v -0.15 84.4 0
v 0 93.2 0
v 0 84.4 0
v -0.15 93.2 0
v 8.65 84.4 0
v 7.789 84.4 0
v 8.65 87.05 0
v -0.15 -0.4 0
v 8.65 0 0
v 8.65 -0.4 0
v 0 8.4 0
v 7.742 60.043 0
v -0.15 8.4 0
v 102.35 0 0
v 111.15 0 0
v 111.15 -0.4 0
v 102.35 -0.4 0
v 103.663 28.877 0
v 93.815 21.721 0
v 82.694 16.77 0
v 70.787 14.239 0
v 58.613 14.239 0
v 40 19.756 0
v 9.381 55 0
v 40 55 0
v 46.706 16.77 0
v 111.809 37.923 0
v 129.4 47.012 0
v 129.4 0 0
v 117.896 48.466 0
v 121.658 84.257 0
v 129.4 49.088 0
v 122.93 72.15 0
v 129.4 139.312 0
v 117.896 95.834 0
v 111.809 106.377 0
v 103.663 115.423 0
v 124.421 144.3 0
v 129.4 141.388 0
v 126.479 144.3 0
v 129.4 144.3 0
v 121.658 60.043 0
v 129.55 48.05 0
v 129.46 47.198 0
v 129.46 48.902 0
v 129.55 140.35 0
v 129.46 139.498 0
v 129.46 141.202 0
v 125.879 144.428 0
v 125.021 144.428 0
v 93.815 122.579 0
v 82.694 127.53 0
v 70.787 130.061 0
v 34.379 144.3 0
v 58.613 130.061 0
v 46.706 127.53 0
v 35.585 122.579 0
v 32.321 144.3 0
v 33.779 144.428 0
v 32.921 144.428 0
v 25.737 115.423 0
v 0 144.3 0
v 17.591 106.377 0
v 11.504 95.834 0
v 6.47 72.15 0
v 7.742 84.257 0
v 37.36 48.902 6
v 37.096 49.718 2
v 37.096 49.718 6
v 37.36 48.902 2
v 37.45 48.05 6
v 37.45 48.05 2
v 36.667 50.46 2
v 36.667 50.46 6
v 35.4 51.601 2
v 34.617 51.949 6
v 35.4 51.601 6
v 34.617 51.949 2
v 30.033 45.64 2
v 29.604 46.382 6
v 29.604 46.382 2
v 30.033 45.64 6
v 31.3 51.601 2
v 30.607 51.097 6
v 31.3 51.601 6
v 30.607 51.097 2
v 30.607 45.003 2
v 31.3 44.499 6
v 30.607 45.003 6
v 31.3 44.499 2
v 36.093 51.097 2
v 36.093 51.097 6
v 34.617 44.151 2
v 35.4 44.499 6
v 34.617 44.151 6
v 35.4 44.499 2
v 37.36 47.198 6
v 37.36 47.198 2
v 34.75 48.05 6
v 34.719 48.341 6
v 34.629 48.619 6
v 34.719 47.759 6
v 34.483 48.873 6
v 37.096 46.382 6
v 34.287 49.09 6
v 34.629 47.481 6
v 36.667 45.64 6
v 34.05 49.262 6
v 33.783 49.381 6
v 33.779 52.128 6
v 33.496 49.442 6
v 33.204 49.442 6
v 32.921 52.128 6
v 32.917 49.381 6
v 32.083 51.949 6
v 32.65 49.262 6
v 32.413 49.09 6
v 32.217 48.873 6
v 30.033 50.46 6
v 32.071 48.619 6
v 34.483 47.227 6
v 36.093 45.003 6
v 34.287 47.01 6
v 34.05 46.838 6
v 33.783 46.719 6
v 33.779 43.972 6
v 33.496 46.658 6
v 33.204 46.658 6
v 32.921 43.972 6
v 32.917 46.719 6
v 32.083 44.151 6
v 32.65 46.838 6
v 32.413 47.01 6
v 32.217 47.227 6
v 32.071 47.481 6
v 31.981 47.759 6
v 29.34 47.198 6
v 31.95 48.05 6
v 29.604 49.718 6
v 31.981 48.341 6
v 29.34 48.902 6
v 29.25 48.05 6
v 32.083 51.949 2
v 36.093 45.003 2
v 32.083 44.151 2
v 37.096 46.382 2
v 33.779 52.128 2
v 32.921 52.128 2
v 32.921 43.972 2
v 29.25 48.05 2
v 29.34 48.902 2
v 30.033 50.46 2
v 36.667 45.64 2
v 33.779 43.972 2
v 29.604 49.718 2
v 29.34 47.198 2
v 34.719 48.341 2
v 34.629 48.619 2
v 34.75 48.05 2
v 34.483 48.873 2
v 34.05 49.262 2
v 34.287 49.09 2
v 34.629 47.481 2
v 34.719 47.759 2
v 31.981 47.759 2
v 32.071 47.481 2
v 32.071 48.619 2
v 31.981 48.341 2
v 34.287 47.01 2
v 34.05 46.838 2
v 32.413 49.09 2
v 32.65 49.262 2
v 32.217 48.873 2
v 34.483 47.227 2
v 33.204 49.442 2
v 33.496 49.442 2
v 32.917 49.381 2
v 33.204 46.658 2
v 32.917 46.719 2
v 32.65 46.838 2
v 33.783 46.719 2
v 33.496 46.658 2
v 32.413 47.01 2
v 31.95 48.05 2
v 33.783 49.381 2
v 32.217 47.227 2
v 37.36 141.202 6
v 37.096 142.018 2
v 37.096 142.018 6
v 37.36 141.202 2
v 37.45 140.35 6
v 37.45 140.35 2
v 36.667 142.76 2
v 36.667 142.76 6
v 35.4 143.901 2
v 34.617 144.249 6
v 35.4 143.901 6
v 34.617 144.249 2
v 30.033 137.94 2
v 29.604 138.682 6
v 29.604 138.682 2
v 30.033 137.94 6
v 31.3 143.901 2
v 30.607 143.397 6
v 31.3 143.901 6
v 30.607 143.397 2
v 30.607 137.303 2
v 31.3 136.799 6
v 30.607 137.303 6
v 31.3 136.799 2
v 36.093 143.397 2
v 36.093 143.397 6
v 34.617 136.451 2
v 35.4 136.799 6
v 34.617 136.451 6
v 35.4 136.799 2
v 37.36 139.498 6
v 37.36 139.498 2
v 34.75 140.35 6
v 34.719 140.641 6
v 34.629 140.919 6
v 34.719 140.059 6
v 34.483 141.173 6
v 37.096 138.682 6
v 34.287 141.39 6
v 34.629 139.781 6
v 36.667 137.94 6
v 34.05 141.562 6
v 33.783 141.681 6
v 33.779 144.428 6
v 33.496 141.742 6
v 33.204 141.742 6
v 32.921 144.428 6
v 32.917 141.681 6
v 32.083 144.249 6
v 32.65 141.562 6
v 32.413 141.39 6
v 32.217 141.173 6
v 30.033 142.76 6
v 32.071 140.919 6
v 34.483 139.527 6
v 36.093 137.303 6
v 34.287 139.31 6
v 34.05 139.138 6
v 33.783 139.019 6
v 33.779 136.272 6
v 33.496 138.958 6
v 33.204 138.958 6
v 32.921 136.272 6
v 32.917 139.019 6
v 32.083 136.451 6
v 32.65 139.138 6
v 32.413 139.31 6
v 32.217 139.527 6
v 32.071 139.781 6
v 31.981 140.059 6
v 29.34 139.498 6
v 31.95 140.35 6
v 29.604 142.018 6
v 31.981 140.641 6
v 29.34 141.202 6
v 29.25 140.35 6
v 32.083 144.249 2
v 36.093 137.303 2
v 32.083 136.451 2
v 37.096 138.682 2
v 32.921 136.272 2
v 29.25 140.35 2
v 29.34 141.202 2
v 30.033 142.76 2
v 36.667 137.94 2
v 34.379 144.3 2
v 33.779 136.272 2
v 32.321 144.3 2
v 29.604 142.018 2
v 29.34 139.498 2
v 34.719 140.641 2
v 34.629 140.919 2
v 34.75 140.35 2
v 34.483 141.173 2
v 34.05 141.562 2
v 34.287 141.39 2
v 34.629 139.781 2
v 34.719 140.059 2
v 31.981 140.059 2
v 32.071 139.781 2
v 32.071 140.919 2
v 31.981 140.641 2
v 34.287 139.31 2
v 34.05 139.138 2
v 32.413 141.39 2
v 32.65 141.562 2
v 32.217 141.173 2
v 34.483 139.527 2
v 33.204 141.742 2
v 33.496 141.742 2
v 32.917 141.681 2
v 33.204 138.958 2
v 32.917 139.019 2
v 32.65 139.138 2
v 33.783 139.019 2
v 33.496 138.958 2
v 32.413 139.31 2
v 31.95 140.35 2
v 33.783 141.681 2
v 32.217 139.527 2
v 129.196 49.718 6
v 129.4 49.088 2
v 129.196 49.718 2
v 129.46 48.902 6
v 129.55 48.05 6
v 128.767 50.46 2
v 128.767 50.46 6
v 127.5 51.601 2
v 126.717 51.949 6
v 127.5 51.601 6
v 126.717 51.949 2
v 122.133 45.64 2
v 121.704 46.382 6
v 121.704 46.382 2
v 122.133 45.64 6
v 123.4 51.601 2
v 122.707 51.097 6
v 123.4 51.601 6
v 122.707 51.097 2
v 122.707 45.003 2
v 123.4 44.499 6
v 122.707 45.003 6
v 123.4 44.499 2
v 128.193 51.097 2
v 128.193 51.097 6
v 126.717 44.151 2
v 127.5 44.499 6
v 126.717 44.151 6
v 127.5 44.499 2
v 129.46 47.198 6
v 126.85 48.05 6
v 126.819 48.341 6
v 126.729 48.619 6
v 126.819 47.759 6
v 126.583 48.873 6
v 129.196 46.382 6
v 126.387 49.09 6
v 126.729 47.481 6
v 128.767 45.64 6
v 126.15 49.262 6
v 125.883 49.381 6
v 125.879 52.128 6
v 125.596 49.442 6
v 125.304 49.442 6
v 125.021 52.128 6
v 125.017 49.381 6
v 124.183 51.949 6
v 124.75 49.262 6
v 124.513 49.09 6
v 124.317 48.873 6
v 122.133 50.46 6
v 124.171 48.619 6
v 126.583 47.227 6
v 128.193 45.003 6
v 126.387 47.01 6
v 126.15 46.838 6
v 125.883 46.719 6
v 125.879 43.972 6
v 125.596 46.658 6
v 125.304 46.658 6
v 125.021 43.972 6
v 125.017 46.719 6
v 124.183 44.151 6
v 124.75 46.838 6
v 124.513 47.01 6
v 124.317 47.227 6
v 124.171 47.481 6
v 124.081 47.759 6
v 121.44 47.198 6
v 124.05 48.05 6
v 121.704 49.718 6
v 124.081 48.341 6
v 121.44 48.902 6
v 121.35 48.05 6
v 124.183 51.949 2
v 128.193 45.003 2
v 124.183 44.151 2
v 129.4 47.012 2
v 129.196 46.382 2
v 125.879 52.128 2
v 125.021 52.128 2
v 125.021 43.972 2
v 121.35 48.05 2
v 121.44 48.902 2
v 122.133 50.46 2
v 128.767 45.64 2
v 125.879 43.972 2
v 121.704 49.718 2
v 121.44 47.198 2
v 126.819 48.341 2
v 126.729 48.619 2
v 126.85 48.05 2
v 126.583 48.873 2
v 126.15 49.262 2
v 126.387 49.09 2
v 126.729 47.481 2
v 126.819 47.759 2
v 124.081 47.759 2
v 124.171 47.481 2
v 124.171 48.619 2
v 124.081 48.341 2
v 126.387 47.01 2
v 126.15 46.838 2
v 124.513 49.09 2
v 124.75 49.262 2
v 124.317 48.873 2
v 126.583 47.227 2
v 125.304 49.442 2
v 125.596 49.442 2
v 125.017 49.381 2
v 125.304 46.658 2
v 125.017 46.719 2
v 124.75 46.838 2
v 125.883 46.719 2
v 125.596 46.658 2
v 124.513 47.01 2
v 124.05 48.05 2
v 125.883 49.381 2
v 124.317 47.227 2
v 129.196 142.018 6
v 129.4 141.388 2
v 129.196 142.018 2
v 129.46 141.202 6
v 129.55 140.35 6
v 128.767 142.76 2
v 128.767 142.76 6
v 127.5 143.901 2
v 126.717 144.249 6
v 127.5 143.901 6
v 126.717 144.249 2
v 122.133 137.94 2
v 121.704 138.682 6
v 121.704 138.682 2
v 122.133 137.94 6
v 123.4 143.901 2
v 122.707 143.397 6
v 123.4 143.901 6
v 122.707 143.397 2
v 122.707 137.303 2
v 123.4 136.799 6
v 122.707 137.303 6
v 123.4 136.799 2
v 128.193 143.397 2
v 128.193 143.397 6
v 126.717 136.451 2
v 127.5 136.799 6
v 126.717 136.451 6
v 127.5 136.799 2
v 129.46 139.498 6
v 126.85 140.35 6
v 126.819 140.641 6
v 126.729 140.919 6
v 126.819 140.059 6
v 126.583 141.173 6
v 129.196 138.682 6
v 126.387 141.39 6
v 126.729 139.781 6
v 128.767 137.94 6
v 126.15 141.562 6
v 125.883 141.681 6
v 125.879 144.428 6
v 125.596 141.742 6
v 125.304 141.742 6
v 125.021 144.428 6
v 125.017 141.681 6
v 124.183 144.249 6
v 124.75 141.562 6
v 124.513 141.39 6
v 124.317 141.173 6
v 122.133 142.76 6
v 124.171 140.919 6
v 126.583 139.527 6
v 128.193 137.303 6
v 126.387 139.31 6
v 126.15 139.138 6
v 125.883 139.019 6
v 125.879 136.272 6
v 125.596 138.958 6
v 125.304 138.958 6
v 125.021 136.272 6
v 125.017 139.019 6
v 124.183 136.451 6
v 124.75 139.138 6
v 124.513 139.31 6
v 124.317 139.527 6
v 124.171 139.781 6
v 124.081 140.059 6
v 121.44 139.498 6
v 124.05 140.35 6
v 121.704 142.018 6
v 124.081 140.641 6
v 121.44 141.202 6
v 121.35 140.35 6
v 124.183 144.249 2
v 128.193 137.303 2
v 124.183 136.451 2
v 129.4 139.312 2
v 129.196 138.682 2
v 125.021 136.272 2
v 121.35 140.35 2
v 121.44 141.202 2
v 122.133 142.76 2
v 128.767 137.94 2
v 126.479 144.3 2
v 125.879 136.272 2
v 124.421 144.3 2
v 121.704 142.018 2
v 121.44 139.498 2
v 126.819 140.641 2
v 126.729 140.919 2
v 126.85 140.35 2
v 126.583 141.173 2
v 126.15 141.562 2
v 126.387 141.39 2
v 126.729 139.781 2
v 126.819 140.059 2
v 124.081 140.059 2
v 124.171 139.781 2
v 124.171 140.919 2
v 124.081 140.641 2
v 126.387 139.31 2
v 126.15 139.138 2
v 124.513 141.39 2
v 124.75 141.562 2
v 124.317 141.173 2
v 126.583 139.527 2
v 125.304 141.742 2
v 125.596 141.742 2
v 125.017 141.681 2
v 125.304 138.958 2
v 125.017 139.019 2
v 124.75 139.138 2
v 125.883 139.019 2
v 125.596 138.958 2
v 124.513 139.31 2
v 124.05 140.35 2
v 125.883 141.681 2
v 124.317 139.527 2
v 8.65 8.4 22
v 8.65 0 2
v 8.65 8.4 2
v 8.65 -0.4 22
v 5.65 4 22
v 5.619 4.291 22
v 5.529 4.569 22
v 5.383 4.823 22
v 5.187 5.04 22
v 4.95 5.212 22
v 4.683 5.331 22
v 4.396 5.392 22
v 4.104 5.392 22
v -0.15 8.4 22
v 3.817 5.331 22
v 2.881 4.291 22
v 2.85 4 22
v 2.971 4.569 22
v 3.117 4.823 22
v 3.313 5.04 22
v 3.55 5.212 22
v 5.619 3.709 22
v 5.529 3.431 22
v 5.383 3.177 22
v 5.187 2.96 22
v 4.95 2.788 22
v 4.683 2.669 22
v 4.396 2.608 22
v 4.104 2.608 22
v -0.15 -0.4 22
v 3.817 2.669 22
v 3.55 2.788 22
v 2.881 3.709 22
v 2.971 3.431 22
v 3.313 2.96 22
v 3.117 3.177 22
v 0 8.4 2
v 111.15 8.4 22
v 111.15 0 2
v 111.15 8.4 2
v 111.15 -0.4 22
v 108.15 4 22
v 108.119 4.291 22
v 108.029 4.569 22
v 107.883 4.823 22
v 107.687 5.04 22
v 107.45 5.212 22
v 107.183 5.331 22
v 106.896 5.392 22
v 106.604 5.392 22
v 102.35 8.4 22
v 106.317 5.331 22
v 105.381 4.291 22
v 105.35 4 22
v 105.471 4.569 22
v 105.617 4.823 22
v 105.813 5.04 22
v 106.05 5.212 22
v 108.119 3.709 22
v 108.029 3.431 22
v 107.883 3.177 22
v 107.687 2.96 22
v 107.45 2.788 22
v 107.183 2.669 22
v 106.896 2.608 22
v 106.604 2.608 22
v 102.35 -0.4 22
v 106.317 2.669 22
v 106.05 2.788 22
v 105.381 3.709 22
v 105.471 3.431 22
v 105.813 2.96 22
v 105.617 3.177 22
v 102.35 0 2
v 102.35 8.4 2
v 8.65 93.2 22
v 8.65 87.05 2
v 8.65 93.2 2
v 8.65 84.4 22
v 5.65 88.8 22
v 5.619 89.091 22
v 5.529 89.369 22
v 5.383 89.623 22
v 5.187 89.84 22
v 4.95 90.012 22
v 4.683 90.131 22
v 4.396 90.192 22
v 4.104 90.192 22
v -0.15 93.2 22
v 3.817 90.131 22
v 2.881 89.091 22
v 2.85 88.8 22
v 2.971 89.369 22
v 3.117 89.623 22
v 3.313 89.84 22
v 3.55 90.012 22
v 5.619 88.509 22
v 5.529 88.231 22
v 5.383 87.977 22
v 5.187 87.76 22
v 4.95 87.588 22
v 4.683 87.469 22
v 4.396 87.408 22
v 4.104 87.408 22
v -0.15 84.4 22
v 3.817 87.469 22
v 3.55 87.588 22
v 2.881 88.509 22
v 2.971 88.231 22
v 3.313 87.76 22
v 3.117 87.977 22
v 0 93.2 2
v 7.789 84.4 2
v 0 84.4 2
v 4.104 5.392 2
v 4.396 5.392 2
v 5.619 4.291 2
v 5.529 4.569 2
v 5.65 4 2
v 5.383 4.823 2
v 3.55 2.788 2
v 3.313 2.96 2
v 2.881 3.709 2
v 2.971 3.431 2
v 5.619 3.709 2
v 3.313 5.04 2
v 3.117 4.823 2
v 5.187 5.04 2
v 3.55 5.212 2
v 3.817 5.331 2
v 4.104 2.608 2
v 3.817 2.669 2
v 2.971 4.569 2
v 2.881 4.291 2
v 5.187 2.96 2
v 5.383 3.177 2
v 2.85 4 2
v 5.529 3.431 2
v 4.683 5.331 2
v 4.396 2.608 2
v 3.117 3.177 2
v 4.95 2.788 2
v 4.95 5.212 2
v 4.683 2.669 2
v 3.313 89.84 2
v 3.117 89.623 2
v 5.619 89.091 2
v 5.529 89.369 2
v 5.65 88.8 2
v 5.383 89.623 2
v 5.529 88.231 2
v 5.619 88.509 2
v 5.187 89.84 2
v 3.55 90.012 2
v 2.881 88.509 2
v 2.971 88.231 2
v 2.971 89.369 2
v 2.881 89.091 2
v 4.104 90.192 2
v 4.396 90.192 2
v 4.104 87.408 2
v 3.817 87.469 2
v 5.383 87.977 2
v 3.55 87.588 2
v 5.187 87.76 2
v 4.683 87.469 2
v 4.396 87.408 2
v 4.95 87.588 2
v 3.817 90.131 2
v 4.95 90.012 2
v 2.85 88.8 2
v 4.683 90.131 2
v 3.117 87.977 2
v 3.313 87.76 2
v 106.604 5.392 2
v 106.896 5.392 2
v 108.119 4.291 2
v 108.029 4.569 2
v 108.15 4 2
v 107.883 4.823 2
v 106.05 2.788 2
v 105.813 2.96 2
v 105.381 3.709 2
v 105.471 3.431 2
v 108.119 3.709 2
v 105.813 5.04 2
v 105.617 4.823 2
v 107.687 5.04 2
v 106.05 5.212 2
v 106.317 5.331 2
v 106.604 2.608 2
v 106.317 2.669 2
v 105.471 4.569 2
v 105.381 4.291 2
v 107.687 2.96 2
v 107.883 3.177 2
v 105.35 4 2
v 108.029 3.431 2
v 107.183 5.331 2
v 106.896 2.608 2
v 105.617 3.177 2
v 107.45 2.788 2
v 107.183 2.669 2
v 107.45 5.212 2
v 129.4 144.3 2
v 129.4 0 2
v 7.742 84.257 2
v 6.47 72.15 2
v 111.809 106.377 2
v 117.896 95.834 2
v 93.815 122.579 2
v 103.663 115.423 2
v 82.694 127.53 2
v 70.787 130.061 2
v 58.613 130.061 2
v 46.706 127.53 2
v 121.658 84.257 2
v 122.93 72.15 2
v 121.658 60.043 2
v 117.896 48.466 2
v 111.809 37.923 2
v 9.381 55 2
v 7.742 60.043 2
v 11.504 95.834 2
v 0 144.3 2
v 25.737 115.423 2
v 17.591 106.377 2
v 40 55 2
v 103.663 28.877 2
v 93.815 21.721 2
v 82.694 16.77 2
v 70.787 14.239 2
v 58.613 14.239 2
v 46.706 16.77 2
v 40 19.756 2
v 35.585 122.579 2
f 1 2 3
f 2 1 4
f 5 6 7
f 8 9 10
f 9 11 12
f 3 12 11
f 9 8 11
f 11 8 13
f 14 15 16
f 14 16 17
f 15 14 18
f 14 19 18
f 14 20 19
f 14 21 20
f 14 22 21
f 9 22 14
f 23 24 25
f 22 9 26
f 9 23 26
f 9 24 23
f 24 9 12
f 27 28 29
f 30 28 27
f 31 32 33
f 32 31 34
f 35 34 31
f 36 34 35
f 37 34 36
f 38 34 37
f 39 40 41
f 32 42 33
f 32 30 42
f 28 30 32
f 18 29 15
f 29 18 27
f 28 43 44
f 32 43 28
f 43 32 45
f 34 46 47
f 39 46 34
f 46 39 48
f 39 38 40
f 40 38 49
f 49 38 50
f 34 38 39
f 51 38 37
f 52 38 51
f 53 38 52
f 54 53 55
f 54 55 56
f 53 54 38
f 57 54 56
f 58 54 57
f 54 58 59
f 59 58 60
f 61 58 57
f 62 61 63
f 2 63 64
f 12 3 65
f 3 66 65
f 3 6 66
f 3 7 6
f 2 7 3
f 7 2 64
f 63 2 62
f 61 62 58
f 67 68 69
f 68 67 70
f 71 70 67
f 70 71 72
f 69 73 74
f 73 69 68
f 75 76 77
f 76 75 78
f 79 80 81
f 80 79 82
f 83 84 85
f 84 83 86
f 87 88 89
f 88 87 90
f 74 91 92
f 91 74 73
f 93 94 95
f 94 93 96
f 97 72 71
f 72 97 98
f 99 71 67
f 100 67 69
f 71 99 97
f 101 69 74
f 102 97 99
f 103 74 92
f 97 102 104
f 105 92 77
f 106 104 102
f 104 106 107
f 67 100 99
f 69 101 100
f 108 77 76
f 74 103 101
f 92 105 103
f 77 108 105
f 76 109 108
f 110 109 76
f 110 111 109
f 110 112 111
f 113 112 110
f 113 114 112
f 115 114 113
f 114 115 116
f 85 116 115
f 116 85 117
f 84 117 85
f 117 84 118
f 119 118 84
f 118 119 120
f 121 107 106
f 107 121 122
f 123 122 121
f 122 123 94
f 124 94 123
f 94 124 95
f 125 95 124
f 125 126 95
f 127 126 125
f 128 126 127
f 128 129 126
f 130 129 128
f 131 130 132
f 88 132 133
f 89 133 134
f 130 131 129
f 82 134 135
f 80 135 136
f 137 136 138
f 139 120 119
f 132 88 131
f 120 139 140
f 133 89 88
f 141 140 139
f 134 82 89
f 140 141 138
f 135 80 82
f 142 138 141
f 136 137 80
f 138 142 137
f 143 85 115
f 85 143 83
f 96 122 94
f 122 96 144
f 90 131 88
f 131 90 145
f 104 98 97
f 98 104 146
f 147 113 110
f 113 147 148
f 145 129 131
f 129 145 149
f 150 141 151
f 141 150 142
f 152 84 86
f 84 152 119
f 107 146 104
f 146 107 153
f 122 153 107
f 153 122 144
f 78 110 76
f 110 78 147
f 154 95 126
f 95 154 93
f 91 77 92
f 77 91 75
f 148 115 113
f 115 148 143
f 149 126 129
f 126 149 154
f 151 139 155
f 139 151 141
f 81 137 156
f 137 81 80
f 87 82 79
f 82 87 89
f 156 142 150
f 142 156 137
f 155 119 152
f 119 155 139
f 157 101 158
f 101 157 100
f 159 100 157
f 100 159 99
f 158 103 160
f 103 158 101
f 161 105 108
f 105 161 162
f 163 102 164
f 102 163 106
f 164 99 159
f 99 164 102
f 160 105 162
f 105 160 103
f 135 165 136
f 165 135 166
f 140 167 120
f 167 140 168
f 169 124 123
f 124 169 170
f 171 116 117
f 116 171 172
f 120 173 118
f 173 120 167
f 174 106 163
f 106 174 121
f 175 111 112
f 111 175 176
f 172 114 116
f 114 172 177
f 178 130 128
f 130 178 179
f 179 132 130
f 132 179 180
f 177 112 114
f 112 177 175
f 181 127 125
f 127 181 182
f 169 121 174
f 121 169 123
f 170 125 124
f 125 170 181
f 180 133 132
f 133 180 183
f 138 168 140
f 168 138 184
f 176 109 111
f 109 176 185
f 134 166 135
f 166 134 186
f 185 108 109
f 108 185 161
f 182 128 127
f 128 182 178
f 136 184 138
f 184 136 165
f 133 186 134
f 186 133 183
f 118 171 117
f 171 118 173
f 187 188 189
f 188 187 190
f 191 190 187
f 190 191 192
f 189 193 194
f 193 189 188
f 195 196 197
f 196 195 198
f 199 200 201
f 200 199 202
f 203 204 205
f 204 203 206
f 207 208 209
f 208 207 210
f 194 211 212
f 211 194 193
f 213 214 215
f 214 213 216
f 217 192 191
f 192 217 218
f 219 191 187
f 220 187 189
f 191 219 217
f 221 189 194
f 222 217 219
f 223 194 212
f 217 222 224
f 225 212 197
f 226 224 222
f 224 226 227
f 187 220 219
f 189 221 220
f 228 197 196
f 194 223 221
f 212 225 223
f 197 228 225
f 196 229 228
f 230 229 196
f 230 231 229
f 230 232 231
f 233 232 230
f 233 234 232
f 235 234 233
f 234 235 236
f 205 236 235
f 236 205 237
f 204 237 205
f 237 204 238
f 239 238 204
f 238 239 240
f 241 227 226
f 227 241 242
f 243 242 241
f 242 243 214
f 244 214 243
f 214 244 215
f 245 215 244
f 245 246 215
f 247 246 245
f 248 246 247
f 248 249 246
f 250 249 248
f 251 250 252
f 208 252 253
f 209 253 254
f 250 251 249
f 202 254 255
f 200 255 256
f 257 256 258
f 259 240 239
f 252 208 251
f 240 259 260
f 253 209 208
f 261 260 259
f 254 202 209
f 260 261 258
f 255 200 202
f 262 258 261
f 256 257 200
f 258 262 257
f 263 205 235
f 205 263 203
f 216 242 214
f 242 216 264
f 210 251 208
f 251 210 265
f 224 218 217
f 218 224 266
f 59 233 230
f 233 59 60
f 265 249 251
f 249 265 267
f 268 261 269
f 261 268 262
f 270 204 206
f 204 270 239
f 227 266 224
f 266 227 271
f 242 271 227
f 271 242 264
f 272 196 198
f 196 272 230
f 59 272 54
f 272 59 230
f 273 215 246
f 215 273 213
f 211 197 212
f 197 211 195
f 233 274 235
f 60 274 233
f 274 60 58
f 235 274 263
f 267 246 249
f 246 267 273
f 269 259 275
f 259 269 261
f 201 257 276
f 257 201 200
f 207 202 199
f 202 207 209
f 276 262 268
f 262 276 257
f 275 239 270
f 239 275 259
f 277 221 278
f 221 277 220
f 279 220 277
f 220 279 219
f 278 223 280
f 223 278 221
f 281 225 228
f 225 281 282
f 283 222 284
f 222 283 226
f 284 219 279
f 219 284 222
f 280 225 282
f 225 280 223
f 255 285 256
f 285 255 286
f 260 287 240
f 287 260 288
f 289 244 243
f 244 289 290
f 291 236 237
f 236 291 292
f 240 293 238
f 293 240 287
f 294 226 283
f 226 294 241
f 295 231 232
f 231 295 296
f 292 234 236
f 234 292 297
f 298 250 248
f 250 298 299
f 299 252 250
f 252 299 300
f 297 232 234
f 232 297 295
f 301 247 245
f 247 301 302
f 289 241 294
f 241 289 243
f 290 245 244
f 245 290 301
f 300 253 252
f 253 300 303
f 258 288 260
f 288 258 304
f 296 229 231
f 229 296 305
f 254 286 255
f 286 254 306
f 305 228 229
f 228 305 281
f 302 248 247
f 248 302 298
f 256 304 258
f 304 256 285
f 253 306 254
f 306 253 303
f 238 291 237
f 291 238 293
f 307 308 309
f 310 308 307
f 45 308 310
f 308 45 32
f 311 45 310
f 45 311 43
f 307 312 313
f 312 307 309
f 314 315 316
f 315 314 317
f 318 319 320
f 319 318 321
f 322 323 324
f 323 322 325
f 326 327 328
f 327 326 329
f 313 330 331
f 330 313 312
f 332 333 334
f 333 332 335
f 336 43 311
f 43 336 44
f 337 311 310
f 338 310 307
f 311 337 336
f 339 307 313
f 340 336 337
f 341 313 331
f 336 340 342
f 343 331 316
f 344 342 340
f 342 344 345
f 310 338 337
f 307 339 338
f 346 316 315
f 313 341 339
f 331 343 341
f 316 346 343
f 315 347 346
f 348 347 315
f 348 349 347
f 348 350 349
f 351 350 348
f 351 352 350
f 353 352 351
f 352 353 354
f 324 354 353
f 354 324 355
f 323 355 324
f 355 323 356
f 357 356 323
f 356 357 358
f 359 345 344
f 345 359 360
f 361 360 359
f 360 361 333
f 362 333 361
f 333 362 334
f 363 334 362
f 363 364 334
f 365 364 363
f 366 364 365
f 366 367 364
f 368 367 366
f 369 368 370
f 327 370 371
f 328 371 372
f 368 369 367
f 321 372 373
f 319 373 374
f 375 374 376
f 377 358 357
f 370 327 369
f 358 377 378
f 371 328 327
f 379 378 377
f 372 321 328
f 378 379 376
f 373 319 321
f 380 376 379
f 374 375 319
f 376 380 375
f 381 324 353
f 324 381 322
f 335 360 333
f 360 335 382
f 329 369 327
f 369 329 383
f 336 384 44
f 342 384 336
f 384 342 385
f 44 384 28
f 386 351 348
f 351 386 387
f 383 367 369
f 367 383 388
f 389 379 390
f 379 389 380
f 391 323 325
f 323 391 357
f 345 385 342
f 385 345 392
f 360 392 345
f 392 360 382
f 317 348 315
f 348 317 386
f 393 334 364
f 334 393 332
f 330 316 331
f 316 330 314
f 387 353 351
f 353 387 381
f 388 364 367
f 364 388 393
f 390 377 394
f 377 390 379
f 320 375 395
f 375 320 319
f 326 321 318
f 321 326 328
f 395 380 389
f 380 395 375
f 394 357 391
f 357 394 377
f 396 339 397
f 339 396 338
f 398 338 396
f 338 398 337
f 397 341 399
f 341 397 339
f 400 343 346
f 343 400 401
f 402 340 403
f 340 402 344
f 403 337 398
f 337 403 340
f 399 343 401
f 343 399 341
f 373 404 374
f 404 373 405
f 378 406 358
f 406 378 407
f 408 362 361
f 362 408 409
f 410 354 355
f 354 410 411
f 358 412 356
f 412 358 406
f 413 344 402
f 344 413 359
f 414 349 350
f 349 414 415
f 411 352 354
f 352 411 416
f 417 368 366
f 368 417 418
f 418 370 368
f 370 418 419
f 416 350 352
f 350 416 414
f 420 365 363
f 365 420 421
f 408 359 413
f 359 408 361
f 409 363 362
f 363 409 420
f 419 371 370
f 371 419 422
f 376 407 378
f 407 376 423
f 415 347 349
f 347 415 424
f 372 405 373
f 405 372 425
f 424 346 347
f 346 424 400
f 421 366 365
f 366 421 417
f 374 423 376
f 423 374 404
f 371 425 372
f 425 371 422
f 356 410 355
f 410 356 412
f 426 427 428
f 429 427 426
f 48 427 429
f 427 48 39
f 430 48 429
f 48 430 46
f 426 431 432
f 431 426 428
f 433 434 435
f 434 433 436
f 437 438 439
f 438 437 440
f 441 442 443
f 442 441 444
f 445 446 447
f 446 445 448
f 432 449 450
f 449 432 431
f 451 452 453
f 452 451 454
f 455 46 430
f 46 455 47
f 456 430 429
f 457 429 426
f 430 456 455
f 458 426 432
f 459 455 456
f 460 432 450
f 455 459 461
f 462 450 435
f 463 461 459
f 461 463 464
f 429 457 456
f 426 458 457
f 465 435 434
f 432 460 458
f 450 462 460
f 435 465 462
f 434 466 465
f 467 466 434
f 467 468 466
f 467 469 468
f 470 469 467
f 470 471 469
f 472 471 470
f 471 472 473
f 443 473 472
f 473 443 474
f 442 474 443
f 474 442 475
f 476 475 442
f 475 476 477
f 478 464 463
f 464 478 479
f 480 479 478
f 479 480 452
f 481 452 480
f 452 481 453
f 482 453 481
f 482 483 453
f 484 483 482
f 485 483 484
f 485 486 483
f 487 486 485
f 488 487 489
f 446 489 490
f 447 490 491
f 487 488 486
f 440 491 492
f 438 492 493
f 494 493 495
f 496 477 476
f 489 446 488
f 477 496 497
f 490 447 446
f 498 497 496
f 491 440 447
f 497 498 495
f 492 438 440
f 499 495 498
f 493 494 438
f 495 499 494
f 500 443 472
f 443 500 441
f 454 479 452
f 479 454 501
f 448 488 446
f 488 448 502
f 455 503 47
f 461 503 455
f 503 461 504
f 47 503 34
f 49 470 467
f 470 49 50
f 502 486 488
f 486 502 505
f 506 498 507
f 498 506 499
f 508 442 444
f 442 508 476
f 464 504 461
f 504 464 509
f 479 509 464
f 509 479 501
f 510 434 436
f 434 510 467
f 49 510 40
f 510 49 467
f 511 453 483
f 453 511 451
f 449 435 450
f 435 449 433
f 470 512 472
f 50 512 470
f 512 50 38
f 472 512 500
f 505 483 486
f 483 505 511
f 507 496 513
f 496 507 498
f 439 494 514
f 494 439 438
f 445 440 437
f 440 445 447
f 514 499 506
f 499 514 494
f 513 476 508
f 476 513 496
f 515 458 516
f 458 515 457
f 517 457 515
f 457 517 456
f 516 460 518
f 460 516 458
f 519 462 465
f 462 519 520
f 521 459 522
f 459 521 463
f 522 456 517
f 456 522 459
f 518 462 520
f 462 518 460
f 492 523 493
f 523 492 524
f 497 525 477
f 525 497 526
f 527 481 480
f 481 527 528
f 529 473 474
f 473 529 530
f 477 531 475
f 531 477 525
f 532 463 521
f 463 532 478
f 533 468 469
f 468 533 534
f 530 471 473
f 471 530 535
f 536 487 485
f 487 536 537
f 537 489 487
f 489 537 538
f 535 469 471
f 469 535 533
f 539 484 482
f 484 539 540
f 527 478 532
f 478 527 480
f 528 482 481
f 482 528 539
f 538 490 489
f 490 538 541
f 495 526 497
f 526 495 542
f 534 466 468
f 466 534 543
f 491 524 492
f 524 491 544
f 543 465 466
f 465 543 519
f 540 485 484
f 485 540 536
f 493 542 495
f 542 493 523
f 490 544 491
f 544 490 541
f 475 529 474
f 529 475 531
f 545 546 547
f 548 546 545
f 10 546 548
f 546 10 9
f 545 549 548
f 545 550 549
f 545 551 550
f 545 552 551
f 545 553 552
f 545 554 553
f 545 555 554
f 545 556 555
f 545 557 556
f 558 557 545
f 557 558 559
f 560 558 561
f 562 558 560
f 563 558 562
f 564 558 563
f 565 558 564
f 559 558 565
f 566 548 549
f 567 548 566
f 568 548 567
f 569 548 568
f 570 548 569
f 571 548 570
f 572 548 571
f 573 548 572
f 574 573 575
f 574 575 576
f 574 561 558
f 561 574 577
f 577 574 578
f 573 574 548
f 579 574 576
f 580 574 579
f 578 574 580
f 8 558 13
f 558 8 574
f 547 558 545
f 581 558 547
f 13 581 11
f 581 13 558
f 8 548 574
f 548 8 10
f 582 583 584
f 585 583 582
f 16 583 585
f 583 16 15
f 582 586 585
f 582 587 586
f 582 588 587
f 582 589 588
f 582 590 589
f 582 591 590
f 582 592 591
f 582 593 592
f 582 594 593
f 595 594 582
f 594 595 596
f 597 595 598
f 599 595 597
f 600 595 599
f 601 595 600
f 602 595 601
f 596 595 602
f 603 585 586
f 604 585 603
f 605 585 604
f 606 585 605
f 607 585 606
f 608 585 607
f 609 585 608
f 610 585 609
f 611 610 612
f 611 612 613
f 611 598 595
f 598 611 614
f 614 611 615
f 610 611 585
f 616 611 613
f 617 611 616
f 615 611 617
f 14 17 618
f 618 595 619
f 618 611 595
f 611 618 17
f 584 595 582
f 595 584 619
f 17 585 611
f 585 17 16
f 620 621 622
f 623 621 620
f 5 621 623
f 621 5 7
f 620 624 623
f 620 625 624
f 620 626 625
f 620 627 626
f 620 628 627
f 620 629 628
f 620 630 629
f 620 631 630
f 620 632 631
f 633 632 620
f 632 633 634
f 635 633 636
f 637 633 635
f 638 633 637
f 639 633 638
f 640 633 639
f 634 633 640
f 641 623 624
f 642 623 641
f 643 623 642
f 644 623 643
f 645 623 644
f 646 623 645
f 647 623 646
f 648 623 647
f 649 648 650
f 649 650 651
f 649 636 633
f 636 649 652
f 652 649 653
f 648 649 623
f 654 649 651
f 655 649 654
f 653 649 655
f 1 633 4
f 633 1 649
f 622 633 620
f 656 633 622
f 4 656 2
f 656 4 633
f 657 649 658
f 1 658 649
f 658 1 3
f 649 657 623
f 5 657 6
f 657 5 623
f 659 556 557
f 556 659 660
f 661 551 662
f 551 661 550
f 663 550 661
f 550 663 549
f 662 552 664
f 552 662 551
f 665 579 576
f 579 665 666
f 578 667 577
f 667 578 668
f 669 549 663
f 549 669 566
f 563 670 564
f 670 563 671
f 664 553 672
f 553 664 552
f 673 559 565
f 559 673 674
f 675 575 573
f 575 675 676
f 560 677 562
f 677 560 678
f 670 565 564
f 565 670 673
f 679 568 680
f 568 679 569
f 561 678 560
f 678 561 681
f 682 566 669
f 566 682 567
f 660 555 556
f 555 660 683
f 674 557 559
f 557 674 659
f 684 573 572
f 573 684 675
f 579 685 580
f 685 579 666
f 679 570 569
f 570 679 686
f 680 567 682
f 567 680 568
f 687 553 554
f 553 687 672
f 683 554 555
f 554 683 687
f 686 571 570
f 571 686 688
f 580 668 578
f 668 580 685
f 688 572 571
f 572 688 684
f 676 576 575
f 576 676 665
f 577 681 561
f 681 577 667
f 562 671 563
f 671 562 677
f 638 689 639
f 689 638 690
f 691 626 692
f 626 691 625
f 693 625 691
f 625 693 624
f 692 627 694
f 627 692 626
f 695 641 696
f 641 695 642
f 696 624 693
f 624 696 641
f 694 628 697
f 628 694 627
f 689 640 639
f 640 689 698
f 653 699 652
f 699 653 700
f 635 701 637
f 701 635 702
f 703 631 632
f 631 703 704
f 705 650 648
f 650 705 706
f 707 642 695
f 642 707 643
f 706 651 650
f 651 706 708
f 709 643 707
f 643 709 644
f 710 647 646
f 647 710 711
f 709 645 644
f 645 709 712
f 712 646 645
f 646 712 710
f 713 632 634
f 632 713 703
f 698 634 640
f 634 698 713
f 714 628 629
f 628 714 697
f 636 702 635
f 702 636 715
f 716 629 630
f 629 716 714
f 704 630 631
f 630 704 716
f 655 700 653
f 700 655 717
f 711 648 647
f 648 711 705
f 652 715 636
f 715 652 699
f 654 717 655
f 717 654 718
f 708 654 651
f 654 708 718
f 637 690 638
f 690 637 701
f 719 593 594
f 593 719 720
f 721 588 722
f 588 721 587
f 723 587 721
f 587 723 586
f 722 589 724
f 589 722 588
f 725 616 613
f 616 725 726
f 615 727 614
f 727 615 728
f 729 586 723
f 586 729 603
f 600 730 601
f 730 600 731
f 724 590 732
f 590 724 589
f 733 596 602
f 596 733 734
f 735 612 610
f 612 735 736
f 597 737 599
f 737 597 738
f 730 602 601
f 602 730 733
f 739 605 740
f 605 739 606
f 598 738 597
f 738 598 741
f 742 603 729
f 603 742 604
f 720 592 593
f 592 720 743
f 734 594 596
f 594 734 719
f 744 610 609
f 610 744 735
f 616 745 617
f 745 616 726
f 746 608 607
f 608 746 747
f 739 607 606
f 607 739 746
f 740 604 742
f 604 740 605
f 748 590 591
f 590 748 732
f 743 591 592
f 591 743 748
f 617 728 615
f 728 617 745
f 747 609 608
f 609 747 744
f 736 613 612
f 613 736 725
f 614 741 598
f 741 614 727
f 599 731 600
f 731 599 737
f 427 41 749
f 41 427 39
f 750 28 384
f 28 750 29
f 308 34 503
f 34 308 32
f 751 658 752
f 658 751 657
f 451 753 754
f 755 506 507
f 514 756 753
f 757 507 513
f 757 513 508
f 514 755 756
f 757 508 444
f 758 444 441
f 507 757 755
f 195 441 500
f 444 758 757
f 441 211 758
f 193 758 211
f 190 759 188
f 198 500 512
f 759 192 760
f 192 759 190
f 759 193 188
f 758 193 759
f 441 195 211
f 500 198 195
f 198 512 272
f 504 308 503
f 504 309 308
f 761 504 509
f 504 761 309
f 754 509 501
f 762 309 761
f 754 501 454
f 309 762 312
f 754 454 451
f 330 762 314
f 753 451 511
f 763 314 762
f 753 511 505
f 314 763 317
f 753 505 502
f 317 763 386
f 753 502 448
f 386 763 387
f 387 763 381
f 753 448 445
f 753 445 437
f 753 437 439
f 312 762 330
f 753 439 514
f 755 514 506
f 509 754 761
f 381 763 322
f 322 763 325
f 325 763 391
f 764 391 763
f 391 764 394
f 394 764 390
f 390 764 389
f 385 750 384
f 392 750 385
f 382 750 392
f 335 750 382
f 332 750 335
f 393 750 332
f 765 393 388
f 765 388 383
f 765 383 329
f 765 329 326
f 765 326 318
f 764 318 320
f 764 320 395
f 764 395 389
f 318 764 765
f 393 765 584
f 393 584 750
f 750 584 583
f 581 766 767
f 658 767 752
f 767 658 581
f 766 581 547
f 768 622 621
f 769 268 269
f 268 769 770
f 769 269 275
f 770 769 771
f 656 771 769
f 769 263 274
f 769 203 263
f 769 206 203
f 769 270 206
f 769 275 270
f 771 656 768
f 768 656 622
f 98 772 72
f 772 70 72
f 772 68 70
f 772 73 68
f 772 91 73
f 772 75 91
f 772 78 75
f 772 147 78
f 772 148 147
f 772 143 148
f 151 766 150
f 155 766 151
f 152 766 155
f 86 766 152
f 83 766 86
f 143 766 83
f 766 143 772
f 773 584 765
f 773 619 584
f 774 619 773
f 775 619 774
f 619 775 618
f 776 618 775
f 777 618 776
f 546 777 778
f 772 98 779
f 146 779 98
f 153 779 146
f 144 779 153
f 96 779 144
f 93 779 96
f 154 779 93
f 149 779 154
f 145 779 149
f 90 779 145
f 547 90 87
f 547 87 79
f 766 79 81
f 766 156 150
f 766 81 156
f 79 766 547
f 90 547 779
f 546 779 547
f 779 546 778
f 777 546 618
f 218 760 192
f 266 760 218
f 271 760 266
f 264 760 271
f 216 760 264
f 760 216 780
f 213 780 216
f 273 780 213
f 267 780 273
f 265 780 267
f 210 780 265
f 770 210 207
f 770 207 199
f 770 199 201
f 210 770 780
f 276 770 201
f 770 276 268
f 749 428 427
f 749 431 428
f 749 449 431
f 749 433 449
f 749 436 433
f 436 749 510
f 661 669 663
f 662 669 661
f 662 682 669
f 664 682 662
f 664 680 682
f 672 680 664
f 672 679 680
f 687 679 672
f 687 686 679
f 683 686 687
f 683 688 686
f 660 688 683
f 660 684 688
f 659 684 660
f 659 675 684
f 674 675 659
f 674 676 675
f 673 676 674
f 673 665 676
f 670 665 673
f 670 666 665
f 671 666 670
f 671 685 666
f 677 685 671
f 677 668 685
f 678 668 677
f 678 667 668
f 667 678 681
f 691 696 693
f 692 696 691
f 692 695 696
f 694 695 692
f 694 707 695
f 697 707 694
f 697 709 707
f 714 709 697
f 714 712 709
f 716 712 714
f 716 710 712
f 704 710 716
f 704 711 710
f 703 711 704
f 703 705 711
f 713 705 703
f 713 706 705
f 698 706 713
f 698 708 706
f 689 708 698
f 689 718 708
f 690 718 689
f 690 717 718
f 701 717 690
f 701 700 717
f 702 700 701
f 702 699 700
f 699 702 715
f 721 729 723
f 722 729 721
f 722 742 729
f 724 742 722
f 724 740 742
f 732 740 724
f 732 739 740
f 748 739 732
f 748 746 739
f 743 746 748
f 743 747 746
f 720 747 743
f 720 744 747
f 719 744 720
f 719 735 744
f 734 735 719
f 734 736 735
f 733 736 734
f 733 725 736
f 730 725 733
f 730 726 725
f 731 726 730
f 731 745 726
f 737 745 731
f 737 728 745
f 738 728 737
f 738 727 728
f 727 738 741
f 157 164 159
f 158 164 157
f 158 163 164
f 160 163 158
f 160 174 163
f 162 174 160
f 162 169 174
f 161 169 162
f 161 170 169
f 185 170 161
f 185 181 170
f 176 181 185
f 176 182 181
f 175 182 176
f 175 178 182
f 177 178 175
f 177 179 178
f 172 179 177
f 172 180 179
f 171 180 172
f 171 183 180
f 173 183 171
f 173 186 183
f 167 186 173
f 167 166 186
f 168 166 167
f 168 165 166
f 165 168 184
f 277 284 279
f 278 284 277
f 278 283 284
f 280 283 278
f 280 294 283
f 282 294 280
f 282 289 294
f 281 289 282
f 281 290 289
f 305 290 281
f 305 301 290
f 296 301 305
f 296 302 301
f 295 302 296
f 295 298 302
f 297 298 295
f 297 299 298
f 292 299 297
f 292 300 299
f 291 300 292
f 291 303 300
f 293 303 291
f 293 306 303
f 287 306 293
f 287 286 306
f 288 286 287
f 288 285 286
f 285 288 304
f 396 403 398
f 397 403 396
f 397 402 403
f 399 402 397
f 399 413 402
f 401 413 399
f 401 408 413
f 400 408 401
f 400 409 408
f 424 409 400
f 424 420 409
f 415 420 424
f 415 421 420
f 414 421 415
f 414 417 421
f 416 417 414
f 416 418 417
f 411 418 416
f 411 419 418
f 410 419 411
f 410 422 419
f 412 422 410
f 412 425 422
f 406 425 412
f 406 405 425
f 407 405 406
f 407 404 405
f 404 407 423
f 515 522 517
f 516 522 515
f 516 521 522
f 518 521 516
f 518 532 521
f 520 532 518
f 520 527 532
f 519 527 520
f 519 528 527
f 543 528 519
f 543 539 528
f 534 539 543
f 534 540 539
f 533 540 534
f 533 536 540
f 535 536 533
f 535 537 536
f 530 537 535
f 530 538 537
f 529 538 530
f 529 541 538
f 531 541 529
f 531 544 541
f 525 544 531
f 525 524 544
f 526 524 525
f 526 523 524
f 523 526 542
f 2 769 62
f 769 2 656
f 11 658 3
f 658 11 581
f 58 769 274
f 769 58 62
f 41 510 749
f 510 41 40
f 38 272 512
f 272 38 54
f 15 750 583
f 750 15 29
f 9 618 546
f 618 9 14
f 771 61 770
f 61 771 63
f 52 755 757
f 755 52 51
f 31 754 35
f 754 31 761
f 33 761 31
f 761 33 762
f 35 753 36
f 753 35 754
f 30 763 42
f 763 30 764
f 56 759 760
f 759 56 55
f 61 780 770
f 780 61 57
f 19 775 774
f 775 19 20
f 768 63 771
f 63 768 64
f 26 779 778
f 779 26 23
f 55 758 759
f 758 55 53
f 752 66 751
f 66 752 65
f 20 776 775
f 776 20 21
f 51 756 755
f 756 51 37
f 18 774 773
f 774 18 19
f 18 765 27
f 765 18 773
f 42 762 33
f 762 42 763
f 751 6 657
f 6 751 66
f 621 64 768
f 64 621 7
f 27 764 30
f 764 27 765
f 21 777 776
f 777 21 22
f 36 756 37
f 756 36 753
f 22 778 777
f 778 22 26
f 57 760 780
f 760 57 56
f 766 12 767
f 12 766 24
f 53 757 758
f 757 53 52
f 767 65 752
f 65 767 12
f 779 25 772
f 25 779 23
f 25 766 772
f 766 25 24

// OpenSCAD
sigma = 0.001;
$fs = 0.01;

module top_board_support(height) {
  support_side = 8.8; // the support pad areas are square
  board_hole_dia = 3.5;
  screw_hole_dia = 2.8; // TODO what should this be?
  
  hole_offset_x = (111.0-102.5)/2;
  hole_offset_y = (92.8-84.8)/2;
  
  %color("green")
    translate([0,0,height+sigma*2])
    difference() {
      cube([111.0, 92.8, 1.6]);
      for( i=[hole_offset_x, 111.0-hole_offset_x], j=[hole_offset_y, 92.8-hole_offset_y])
        translate([i,j,-sigma])
          cylinder(h=4, d=board_hole_dia, center=true);
    }
  
  difference() {
    union() {
      translate([hole_offset_x, hole_offset_y, height/2])
        cube([support_side, support_side, height], center=true);
      translate([111.0-hole_offset_x, hole_offset_y, height/2])
        cube([support_side, support_side, height], center=true);
      translate([hole_offset_x, 92.8-hole_offset_y, height/2])
        cube([support_side, support_side, height], center=true);
    }
    for( i=[hole_offset_x, 111.0-hole_offset_x], j=[hole_offset_y, 92.8-hole_offset_y])
        translate([i, j, -sigma])
          cylinder(h=height*3, d=screw_hole_dia, center=true);
  }
}

module bottom_board_support(height) {
  support_dia = 8.2;
  board_hole_dia = 3.0;
  screw_hole_dia = 2.8; // TODO what should this be?
  
  hole_offset = (100.0-92.1)/2;
  %color("darkgreen")
    translate([0,0,height])
    difference() {
      cube([100.0, 100.2, 1.6]);
      union() {
        for( i=[hole_offset, 100.0-hole_offset], j=[hole_offset, 100.2-hole_offset])
          translate([i, j, -sigma])
            cylinder(h=4, d=board_hole_dia, center=true);
      }
    }
  
    for( i=[hole_offset, 100.0-hole_offset], j=[hole_offset, 100.2-hole_offset])
      translate([i, j, height/2])
        difference() {
          cylinder(h=height, d=support_dia, center=true);
          translate([0,0,-sigma])
            cylinder(h=height*3, d=screw_hole_dia, center=true);
        }
}

module base_plate(height) {
  w = 111.0 + 18.4;
  h = 92.8 + 51.5;
  difference() {
    cube([w, h, height]);
    translate([w/2, h/2, 0])
      cylinder(d=w*.9, h=height*3, center=true);
  }
  cube([40, 55, height]);
}

base_plate_height = 2;
lower_board_support_height = base_plate_height + 4;
translate([111.0+18.4-100.0, 92.8+51.5-100.2, 0])
  bottom_board_support(lower_board_support_height);
top_board_support(16.0 + lower_board_support_height);
base_plate(base_plate_height);
